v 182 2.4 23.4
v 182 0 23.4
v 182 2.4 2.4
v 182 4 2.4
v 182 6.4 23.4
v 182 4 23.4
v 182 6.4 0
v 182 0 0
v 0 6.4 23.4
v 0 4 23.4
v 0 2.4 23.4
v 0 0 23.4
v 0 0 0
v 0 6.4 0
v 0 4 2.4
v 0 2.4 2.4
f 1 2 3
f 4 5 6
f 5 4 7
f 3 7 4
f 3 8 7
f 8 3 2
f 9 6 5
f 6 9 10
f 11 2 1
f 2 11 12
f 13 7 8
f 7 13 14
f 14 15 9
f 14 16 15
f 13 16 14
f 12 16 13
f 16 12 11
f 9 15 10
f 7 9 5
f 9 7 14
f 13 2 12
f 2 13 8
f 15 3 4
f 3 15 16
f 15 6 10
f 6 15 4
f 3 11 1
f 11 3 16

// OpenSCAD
$fn = $preview ? 16 : 64;

// length of blade
length = 182;
// height of sheath
height = 21;
// width of blade
width = 1.6;
// width of wall
wall = 2.4;

module __hidden__ () {}

eps = 0.1;

difference() {
    cube([length, width + 2 * wall, height + wall]);
    translate([-eps, wall, wall])
        cube([length + 2 * eps, width, height + eps]);
}
